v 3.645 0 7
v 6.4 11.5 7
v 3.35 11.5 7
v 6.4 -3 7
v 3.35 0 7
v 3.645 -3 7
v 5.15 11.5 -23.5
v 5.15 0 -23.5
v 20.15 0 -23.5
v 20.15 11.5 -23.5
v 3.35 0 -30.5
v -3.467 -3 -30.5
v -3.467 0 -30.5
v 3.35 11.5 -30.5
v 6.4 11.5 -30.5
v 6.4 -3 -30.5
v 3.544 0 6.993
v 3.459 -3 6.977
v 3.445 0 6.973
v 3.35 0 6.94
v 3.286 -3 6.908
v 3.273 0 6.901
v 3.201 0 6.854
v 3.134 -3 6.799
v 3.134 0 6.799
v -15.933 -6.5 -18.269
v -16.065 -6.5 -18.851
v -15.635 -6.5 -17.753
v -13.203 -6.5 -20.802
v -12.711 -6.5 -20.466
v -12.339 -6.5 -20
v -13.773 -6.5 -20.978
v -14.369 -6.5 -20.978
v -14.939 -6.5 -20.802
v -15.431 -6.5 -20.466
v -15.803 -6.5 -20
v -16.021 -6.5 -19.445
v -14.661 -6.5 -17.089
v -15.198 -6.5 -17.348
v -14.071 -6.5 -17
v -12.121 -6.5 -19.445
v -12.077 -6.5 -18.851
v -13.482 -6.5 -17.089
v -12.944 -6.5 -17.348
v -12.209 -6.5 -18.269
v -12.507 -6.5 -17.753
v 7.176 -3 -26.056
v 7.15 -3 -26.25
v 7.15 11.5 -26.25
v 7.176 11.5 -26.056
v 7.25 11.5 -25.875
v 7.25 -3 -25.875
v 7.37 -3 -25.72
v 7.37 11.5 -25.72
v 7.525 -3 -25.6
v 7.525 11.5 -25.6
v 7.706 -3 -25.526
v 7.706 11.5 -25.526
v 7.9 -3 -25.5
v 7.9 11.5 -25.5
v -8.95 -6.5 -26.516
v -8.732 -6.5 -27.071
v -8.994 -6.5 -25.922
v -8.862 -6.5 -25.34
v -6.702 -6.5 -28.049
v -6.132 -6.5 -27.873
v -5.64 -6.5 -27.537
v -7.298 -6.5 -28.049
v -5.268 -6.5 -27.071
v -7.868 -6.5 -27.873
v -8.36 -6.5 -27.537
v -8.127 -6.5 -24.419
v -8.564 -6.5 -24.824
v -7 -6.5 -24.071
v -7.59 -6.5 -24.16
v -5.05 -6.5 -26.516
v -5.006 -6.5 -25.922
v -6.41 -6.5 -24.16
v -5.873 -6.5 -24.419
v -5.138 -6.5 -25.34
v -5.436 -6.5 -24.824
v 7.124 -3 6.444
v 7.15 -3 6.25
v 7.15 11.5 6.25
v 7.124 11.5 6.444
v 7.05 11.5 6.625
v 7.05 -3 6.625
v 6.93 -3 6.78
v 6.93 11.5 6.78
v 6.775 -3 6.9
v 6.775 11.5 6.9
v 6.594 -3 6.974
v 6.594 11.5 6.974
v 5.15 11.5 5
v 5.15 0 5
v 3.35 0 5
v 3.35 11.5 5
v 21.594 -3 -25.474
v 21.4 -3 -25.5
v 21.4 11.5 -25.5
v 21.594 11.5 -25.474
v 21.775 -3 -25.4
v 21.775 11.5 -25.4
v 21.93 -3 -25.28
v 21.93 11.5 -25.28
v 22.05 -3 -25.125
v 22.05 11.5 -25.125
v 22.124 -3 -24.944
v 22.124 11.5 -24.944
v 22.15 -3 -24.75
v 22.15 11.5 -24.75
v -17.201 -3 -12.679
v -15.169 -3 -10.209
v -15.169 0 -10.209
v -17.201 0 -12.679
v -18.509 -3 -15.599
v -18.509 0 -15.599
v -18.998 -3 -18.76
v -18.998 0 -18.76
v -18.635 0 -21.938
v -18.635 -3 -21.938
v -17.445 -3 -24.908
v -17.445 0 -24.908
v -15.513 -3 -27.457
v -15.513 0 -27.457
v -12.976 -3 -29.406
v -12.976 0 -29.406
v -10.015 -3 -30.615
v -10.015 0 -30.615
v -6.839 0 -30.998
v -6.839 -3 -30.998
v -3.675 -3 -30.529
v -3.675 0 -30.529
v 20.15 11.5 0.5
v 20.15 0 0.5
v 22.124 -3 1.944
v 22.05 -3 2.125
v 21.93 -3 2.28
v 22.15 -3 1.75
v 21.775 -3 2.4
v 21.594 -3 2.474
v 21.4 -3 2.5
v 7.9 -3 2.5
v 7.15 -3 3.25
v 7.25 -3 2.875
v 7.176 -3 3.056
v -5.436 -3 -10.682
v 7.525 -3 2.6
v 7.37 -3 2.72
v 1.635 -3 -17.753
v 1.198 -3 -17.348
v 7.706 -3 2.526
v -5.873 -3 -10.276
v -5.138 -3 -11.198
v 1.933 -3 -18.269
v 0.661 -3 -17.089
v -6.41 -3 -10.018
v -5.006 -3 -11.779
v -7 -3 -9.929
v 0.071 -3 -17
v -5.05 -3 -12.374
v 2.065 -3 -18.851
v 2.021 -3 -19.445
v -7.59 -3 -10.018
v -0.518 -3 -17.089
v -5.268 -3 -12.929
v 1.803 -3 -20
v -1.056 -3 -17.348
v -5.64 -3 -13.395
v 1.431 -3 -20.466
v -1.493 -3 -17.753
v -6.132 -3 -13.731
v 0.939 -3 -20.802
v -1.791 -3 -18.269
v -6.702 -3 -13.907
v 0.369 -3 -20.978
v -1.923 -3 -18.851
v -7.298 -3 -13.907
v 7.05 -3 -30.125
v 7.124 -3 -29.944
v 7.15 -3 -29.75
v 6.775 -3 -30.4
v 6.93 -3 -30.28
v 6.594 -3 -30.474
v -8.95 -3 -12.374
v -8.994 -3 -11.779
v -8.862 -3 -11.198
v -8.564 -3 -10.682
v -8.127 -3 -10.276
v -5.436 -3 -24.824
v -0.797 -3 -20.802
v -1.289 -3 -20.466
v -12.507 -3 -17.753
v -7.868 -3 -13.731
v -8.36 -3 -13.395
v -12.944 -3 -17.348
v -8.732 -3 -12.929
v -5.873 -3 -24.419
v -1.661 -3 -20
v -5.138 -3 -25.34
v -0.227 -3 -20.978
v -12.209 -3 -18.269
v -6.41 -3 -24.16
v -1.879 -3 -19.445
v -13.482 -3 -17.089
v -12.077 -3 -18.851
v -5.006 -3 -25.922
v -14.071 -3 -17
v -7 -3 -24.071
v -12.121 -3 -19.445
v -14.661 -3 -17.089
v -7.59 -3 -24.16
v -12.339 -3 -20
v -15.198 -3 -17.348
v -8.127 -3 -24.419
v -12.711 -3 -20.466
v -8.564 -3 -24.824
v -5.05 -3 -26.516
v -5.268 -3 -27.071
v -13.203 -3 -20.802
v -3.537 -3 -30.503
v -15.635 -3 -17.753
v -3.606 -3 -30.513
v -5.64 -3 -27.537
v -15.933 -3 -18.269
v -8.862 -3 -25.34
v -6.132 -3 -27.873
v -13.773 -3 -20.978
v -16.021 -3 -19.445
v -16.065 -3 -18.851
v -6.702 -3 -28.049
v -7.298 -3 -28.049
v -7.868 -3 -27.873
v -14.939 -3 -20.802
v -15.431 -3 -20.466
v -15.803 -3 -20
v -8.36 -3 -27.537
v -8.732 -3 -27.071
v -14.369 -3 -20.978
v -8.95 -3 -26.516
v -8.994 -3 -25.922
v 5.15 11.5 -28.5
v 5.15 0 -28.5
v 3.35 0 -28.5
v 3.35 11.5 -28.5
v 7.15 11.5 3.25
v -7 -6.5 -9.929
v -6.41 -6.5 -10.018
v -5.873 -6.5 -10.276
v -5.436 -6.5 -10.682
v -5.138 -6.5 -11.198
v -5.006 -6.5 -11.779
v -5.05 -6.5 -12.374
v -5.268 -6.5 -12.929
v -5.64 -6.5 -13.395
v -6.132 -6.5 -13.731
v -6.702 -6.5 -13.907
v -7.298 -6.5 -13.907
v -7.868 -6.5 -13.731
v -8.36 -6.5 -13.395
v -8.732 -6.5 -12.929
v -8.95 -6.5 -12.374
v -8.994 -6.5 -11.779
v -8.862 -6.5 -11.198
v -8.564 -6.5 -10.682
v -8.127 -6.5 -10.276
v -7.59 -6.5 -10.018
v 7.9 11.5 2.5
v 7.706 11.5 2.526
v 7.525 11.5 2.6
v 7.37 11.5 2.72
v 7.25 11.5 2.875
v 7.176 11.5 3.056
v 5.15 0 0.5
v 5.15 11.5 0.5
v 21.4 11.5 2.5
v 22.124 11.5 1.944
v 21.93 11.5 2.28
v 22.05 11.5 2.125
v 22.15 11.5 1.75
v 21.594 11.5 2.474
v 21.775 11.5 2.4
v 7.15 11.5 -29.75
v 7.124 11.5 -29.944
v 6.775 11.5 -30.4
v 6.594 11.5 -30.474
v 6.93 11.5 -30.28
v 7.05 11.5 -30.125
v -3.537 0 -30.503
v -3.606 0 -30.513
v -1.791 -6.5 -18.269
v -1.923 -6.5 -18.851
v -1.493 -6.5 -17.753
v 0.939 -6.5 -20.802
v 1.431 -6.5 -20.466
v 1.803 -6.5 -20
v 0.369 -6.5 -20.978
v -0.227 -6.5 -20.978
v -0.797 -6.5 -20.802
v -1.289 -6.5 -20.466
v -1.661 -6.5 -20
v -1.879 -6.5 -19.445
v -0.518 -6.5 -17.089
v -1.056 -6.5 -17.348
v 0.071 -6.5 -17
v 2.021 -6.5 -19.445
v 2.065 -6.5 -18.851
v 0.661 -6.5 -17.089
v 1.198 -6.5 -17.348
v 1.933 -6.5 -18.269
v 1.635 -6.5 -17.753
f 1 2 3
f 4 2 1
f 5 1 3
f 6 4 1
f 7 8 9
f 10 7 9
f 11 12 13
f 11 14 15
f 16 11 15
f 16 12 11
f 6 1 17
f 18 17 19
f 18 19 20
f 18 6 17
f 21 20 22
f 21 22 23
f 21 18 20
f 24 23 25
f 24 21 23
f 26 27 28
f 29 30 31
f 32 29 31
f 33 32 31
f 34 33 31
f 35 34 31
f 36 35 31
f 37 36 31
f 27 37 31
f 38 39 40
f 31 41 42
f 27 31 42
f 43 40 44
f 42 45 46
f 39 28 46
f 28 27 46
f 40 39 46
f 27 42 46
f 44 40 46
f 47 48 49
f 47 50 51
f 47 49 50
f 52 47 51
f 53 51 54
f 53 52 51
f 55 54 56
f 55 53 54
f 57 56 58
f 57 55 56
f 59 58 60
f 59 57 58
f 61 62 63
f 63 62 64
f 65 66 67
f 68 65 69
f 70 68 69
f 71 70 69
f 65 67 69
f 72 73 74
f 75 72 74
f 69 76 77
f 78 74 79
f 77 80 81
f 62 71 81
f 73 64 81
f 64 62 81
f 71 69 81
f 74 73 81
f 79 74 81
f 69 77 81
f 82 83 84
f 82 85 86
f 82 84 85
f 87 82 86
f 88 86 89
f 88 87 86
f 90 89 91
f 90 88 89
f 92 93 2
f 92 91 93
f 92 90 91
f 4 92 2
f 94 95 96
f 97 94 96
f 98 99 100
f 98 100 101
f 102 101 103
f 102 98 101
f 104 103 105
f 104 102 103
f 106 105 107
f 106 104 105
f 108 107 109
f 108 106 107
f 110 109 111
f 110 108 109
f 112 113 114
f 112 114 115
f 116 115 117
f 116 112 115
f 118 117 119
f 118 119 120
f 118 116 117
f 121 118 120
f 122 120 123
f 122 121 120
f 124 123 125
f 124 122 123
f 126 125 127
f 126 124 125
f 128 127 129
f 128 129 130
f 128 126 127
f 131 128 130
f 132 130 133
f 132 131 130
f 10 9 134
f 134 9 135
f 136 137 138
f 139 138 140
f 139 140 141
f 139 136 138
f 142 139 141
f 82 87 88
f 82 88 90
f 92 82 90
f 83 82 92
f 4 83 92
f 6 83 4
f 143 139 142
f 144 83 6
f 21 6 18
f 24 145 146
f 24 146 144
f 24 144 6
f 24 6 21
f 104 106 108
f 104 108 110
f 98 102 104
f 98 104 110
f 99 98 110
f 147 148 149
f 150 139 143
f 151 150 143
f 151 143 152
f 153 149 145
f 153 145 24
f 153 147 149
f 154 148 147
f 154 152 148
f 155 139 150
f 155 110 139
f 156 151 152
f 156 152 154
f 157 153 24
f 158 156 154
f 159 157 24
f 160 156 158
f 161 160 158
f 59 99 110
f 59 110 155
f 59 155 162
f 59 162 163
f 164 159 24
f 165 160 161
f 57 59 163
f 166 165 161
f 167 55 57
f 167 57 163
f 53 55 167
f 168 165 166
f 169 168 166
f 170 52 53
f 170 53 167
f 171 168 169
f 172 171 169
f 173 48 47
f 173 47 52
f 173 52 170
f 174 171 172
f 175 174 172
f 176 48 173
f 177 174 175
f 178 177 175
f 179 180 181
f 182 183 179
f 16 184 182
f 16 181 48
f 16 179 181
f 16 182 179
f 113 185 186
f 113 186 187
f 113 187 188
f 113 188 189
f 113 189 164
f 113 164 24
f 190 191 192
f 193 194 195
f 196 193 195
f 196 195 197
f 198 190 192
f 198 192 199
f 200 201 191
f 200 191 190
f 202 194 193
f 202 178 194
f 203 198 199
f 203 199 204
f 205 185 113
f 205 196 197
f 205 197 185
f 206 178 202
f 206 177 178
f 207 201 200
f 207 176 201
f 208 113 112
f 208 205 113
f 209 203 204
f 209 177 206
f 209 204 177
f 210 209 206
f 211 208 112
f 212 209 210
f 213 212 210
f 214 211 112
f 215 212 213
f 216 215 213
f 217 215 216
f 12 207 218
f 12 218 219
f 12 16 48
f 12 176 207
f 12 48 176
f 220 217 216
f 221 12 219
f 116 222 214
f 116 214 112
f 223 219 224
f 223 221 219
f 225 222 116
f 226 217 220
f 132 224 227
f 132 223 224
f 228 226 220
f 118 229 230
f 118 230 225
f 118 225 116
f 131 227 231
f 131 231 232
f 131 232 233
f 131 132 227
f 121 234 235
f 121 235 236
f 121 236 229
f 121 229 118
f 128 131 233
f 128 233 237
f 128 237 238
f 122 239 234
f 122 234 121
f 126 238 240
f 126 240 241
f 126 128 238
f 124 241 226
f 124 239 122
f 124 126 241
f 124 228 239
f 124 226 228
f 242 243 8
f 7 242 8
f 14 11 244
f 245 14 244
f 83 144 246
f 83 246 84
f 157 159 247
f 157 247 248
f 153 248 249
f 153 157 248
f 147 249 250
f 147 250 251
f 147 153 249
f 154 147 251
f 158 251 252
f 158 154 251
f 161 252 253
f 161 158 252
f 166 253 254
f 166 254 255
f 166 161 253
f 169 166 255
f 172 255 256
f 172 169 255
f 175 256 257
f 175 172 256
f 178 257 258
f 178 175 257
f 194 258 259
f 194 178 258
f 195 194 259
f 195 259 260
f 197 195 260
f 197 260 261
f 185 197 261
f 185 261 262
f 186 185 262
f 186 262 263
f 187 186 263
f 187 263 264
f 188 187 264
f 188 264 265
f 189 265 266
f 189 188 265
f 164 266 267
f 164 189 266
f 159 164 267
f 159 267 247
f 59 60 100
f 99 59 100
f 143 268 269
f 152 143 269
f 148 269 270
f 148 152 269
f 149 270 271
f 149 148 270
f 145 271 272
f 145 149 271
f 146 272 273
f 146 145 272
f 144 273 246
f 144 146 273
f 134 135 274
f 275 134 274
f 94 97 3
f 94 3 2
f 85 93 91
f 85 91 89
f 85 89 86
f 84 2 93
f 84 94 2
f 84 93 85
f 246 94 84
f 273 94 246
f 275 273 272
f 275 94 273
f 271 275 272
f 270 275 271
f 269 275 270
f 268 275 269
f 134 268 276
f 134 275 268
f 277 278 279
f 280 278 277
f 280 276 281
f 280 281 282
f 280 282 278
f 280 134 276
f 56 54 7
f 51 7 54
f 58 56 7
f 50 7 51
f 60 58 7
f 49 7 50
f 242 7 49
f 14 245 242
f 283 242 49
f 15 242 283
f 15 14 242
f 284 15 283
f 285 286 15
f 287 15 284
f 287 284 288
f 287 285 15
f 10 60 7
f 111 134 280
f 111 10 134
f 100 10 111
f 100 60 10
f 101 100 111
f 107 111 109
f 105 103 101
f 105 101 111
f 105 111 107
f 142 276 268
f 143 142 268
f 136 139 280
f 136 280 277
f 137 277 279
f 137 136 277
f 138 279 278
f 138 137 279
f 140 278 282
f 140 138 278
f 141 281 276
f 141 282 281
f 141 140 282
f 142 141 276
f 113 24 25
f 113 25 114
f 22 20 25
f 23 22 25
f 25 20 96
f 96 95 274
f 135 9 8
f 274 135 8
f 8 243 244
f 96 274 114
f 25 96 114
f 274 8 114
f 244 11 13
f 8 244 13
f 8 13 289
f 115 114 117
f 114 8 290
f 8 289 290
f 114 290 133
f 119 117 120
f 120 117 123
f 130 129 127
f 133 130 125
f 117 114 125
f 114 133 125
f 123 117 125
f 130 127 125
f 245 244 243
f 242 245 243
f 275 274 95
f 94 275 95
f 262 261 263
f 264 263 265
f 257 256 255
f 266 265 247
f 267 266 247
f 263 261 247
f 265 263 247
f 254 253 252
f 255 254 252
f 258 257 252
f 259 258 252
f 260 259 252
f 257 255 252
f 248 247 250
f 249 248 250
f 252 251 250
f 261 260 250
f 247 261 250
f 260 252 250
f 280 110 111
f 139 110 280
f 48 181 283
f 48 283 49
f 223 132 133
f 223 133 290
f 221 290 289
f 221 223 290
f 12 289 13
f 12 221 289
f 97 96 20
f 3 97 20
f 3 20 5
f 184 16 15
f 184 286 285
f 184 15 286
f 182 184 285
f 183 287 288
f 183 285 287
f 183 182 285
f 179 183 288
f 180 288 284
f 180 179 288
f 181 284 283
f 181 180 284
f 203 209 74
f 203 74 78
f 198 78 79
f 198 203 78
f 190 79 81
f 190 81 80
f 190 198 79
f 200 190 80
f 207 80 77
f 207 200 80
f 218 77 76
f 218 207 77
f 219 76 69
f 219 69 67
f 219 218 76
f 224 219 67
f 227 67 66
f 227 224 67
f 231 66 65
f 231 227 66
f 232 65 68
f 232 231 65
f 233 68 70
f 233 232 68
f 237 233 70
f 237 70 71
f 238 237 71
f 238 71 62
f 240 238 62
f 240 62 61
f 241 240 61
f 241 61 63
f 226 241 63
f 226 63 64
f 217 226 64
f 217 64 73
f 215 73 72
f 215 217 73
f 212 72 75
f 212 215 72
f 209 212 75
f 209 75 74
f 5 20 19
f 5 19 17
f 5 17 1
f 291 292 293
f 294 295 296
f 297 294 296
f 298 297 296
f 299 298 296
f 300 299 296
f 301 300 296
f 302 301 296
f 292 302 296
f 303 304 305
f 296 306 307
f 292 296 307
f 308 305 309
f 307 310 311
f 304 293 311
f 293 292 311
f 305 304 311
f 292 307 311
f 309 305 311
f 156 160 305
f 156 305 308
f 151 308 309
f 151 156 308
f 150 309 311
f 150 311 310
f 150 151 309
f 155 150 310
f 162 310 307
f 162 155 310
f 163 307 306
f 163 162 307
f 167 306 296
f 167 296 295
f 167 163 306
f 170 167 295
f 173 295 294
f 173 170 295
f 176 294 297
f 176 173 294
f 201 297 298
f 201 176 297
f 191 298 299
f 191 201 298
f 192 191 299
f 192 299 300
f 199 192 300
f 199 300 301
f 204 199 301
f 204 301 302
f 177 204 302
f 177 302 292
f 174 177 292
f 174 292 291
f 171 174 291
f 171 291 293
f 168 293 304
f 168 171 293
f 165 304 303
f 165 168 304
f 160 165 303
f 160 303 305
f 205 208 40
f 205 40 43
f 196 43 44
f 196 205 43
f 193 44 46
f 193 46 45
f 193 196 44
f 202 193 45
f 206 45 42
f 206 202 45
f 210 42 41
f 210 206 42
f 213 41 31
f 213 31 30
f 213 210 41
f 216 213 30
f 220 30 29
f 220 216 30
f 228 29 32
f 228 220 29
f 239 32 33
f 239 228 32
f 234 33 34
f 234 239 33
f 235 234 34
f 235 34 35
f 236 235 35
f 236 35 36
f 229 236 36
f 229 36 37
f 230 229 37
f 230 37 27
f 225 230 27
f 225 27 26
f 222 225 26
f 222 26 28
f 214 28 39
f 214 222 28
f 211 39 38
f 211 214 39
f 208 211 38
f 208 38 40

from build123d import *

# Parameters (mm, degrees)
BRACKET_DEPTH       = 11.5
BOSS_EXTRUDE1_START = -3
BOSS_EXTRUDE1_DEPTH = 3
BOSS_EXTRUDE2_START = -3
SKETCH15_R          = 2
BOSS_EXTRUDE2_DEPTH = 3.5


with BuildPart() as part:
    # Sketch9 → Bracket (new body)
    with BuildSketch(Plane(origin=(0, 0, 0), x_dir=(1, 0, 0), z_dir=(0, 1, 0))):
        with BuildLine():
            Line((5.15, -5), (4.65, -5))
            Line((4.65, -5), (3.35, -5))
            Line((3.35, -5), (3.35, -7))
            Line((3.35, -7), (6.4, -7))
            ThreePointArc((6.4, -7), (6.930330086, -6.780330086), (7.15, -6.25))
            Line((7.15, -6.25), (7.15, -5))
            Line((7.15, -5), (7.15, -3.25))
            ThreePointArc((7.15, -3.25), (7.369669914, -2.719669914), (7.9, -2.5))
            Line((7.9, -2.5), (21.4, -2.5))
            ThreePointArc((21.4, -2.5), (21.930330086, -2.280330086), (22.15, -1.75))
            Line((22.15, -1.75), (22.15, 24.75))
            ThreePointArc((22.15, 24.75), (21.930330086, 25.280330086), (21.4, 25.5))
            Line((21.4, 25.5), (7.9, 25.5))
            ThreePointArc((7.9, 25.5), (7.369669914, 25.719669914), (7.15, 26.25))
            Line((7.15, 26.25), (7.15, 28))
            Line((7.15, 28), (7.15, 29.75))
            ThreePointArc((7.15, 29.75), (6.930330086, 30.280330086), (6.4, 30.5))
            Line((6.4, 30.5), (5.15, 30.5))
            Line((5.15, 30.5), (3.35, 30.5))
            Line((3.35, 30.5), (3.35, 28.5))
            Line((3.35, 28.5), (5.15, 28.5))
            Line((5.15, 28.5), (5.15, 28))
            Line((5.15, 28), (5.15, 23.5))
            Line((5.15, 23.5), (20.15, 23.5))
            Line((20.15, 23.5), (20.15, -0.5))
            Line((20.15, -0.5), (5.15, -0.5))
            Line((5.15, -0.5), (5.15, -5))
        make_face()
    extrude(amount=BRACKET_DEPTH)

    # Sketch12 → Boss-Extrude1 (add)
    with BuildSketch(Plane(origin=(0, 0, 0), x_dir=(1, 0, 0), z_dir=(0, 1, 0)).offset(BOSS_EXTRUDE1_START)):
        with BuildLine():
            Line((3.134136634, -6.799408153), (-15.169112008, 10.208954707))
            ThreePointArc((-15.169112008, 10.208954707), (-17.445237733, 24.907700028), (-3.6745965, 30.529381479))
            ThreePointArc((-3.6745965, 30.529381479), (-3.571695801, 30.507381696), (-3.466728879, 30.5))
            Line((-3.466728879, 30.5), (6.4, 30.5))
            ThreePointArc((6.4, 30.5), (6.930330086, 30.280330086), (7.15, 29.75))
            Line((7.15, 29.75), (7.15, 26.25))
            ThreePointArc((7.15, 26.25), (7.369669914, 25.719669914), (7.9, 25.5))
            Line((7.9, 25.5), (21.4, 25.5))
            ThreePointArc((21.4, 25.5), (21.930330086, 25.280330086), (22.15, 24.75))
            Line((22.15, 24.75), (22.15, -1.75))
            ThreePointArc((22.15, -1.75), (21.930330086, -2.280330086), (21.4, -2.5))
            Line((21.4, -2.5), (7.9, -2.5))
            ThreePointArc((7.9, -2.5), (7.369669914, -2.719669914), (7.15, -3.25))
            Line((7.15, -3.25), (7.15, -6.25))
            ThreePointArc((7.15, -6.25), (6.930330086, -6.780330086), (6.4, -7))
            Line((6.4, -7), (3.644676233, -7))
            ThreePointArc((3.644676233, -7), (3.370410043, -6.948053048), (3.134136634, -6.799408153))
        make_face()
    extrude(amount=BOSS_EXTRUDE1_DEPTH)

    # Sketch15 → Boss-Extrude2 (add)
    with BuildSketch(Plane(origin=(0, 0, 0), x_dir=(1, 0, 0), z_dir=(0, 1, 0)).offset(BOSS_EXTRUDE2_START)):
        with Locations(Location((-7, 26.071067812, 0), (0, 0, 270))):
            Circle(SKETCH15_R)
        with Locations(Location((0.071067812, 19, 0), (0, 0, 270))):
            Circle(SKETCH15_R)
        with Locations(Location((-7, 11.928932188, 0), (0, 0, 270))):
            Circle(SKETCH15_R)
        with Locations(Location((-14.071067812, 19, 0), (0, 0, 270))):
            Circle(SKETCH15_R)
    extrude(amount=-BOSS_EXTRUDE2_DEPTH)


solid = part.part
